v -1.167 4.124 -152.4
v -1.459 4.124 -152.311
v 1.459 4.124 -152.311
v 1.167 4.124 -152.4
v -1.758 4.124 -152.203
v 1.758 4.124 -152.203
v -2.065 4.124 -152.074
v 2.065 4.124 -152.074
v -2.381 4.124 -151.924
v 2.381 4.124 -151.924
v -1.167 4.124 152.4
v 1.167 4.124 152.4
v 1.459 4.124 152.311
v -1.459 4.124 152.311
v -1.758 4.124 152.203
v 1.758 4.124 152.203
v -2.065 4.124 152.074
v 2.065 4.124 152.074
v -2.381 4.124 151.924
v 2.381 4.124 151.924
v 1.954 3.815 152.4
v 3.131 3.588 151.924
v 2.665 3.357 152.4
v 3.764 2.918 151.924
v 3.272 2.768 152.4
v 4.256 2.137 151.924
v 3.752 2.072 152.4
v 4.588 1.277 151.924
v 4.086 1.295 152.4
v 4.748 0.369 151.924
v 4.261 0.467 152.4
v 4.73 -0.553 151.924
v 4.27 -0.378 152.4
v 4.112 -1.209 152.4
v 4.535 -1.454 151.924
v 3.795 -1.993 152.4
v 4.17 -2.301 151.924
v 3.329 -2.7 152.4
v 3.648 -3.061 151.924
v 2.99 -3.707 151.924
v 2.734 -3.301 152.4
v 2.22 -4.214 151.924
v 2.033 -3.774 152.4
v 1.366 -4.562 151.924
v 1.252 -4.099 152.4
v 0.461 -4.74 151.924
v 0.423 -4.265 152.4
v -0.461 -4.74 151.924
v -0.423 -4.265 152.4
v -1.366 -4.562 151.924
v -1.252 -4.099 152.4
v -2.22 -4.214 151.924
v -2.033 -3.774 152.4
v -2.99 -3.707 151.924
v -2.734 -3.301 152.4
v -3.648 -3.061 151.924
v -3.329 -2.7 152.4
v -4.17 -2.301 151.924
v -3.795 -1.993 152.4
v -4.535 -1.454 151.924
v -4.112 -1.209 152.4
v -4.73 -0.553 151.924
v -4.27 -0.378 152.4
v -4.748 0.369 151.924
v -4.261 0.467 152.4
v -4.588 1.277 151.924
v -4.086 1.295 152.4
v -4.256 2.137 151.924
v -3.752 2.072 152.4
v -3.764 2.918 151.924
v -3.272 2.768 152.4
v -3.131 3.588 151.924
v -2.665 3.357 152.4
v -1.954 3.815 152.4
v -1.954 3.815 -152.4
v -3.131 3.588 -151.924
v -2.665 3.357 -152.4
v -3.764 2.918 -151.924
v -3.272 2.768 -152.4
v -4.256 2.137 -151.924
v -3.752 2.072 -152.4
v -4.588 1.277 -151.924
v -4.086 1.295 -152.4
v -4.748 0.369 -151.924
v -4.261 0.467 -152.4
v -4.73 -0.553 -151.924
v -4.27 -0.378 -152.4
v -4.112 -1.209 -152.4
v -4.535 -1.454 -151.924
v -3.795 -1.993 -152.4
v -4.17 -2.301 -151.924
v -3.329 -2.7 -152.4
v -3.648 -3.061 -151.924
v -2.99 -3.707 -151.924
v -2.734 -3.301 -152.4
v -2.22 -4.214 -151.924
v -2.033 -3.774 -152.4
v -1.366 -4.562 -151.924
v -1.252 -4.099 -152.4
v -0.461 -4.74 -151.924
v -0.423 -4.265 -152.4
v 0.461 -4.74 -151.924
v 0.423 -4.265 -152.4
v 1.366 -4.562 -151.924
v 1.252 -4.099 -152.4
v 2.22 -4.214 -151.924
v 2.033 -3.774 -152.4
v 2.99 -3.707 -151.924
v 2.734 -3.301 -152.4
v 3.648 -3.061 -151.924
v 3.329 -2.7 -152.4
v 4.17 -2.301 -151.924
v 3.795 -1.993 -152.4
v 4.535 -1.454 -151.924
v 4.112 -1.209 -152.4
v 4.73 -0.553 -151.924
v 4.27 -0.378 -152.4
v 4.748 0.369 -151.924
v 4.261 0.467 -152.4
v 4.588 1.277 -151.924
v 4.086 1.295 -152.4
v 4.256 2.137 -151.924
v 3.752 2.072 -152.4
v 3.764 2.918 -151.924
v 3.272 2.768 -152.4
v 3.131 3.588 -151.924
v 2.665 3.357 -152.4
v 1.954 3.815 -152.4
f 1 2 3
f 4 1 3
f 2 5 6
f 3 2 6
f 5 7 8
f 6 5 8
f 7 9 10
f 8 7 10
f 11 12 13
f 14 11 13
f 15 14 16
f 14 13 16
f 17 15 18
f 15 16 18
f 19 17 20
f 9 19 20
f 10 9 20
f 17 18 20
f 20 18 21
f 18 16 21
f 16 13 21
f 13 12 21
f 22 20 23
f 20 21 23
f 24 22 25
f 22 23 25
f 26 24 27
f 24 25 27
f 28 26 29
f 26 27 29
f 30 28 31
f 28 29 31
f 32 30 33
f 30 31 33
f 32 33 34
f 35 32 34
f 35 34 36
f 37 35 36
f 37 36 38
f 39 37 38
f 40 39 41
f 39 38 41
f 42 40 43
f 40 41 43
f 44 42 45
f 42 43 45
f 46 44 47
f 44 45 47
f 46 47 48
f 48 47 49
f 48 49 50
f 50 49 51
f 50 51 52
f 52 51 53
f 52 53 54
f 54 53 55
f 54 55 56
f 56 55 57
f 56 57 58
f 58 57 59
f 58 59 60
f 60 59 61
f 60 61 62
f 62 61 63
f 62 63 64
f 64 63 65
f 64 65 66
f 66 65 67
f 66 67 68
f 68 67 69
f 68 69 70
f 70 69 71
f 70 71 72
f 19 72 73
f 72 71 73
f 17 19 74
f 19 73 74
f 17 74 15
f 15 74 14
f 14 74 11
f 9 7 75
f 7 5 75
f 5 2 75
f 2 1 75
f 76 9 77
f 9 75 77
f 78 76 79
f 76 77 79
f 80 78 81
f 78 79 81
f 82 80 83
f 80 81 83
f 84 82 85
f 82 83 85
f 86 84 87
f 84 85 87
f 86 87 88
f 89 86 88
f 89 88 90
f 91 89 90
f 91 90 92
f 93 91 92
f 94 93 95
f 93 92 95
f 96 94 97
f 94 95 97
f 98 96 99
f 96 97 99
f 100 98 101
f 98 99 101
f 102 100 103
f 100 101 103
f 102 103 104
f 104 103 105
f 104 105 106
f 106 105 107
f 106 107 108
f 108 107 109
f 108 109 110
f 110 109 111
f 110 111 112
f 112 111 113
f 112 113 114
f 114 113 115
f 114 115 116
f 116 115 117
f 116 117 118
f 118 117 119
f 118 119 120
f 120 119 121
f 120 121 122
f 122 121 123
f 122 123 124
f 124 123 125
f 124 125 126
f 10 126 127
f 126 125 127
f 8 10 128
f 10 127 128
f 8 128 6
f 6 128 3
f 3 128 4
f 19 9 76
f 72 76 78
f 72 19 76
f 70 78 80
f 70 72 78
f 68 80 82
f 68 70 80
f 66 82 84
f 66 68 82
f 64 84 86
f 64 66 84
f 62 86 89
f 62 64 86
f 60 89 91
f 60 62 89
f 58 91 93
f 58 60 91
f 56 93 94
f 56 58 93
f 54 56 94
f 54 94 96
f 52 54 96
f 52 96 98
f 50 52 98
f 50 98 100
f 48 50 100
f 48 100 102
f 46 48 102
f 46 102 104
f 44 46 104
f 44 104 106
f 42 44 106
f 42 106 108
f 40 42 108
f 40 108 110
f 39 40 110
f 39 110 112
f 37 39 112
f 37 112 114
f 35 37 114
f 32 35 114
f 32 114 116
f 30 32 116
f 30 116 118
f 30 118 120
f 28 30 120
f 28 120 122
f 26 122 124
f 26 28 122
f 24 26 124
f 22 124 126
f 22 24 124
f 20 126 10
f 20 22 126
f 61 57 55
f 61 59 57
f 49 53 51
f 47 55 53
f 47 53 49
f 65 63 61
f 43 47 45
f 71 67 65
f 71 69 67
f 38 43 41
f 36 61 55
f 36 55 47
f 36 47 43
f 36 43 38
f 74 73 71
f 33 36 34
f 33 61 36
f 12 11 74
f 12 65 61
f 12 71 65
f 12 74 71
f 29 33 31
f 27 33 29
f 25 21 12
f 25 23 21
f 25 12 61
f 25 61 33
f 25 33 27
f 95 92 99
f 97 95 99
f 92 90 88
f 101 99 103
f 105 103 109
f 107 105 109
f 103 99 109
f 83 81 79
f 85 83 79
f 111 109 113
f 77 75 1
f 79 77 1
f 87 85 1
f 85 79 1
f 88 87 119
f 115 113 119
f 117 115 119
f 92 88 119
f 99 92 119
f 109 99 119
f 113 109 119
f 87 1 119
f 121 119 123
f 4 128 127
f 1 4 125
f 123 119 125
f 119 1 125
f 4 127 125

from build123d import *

# Parameters (mm, degrees)
SKETCH3_R                = 4.7625
BOSS_EXTRUDE2_DEPTH      = 152.4
BOSS_EXTRUDE2_DEPTH_BACK = 152.4
CUT_EXTRUDE5_DEPTH       = 153.4
CUT_EXTRUDE5_DEPTH_BACK  = 153.4
CHAMFER1_SIZE            = 0.47625


with BuildPart() as part:
    # Sketch3 → Boss-Extrude2 (new body, two sides)
    with BuildSketch(Plane.XY) as boss_extrude2_sk:
        Circle(SKETCH3_R)
    extrude(amount=BOSS_EXTRUDE2_DEPTH)
    extrude(boss_extrude2_sk.sketch, amount=-BOSS_EXTRUDE2_DEPTH_BACK)

    # Sketch10 → Cut-Extrude5 (cut, two sides)
    with BuildSketch(Plane.XY) as cut_extrude5_sk:
        with BuildLine():
            Line((-2.38125, 4.124445986), (2.38125, 4.124445986))
            ThreePointArc((2.38125, 4.124445986), (0, 4.7625), (-2.38125, 4.124445986))
        make_face()
    extrude(amount=CUT_EXTRUDE5_DEPTH, mode=Mode.SUBTRACT)
    extrude(cut_extrude5_sk.sketch, amount=-CUT_EXTRUDE5_DEPTH_BACK, mode=Mode.SUBTRACT)

    # Chamfer1
    chamfer1_edges = [part.edges().sort_by_distance(p)[0] for p in [
        (0, -4.7625, -152.4),
        (0, -4.7625, 152.4),
    ]]
    chamfer(chamfer1_edges, length=CHAMFER1_SIZE)


solid = part.part
